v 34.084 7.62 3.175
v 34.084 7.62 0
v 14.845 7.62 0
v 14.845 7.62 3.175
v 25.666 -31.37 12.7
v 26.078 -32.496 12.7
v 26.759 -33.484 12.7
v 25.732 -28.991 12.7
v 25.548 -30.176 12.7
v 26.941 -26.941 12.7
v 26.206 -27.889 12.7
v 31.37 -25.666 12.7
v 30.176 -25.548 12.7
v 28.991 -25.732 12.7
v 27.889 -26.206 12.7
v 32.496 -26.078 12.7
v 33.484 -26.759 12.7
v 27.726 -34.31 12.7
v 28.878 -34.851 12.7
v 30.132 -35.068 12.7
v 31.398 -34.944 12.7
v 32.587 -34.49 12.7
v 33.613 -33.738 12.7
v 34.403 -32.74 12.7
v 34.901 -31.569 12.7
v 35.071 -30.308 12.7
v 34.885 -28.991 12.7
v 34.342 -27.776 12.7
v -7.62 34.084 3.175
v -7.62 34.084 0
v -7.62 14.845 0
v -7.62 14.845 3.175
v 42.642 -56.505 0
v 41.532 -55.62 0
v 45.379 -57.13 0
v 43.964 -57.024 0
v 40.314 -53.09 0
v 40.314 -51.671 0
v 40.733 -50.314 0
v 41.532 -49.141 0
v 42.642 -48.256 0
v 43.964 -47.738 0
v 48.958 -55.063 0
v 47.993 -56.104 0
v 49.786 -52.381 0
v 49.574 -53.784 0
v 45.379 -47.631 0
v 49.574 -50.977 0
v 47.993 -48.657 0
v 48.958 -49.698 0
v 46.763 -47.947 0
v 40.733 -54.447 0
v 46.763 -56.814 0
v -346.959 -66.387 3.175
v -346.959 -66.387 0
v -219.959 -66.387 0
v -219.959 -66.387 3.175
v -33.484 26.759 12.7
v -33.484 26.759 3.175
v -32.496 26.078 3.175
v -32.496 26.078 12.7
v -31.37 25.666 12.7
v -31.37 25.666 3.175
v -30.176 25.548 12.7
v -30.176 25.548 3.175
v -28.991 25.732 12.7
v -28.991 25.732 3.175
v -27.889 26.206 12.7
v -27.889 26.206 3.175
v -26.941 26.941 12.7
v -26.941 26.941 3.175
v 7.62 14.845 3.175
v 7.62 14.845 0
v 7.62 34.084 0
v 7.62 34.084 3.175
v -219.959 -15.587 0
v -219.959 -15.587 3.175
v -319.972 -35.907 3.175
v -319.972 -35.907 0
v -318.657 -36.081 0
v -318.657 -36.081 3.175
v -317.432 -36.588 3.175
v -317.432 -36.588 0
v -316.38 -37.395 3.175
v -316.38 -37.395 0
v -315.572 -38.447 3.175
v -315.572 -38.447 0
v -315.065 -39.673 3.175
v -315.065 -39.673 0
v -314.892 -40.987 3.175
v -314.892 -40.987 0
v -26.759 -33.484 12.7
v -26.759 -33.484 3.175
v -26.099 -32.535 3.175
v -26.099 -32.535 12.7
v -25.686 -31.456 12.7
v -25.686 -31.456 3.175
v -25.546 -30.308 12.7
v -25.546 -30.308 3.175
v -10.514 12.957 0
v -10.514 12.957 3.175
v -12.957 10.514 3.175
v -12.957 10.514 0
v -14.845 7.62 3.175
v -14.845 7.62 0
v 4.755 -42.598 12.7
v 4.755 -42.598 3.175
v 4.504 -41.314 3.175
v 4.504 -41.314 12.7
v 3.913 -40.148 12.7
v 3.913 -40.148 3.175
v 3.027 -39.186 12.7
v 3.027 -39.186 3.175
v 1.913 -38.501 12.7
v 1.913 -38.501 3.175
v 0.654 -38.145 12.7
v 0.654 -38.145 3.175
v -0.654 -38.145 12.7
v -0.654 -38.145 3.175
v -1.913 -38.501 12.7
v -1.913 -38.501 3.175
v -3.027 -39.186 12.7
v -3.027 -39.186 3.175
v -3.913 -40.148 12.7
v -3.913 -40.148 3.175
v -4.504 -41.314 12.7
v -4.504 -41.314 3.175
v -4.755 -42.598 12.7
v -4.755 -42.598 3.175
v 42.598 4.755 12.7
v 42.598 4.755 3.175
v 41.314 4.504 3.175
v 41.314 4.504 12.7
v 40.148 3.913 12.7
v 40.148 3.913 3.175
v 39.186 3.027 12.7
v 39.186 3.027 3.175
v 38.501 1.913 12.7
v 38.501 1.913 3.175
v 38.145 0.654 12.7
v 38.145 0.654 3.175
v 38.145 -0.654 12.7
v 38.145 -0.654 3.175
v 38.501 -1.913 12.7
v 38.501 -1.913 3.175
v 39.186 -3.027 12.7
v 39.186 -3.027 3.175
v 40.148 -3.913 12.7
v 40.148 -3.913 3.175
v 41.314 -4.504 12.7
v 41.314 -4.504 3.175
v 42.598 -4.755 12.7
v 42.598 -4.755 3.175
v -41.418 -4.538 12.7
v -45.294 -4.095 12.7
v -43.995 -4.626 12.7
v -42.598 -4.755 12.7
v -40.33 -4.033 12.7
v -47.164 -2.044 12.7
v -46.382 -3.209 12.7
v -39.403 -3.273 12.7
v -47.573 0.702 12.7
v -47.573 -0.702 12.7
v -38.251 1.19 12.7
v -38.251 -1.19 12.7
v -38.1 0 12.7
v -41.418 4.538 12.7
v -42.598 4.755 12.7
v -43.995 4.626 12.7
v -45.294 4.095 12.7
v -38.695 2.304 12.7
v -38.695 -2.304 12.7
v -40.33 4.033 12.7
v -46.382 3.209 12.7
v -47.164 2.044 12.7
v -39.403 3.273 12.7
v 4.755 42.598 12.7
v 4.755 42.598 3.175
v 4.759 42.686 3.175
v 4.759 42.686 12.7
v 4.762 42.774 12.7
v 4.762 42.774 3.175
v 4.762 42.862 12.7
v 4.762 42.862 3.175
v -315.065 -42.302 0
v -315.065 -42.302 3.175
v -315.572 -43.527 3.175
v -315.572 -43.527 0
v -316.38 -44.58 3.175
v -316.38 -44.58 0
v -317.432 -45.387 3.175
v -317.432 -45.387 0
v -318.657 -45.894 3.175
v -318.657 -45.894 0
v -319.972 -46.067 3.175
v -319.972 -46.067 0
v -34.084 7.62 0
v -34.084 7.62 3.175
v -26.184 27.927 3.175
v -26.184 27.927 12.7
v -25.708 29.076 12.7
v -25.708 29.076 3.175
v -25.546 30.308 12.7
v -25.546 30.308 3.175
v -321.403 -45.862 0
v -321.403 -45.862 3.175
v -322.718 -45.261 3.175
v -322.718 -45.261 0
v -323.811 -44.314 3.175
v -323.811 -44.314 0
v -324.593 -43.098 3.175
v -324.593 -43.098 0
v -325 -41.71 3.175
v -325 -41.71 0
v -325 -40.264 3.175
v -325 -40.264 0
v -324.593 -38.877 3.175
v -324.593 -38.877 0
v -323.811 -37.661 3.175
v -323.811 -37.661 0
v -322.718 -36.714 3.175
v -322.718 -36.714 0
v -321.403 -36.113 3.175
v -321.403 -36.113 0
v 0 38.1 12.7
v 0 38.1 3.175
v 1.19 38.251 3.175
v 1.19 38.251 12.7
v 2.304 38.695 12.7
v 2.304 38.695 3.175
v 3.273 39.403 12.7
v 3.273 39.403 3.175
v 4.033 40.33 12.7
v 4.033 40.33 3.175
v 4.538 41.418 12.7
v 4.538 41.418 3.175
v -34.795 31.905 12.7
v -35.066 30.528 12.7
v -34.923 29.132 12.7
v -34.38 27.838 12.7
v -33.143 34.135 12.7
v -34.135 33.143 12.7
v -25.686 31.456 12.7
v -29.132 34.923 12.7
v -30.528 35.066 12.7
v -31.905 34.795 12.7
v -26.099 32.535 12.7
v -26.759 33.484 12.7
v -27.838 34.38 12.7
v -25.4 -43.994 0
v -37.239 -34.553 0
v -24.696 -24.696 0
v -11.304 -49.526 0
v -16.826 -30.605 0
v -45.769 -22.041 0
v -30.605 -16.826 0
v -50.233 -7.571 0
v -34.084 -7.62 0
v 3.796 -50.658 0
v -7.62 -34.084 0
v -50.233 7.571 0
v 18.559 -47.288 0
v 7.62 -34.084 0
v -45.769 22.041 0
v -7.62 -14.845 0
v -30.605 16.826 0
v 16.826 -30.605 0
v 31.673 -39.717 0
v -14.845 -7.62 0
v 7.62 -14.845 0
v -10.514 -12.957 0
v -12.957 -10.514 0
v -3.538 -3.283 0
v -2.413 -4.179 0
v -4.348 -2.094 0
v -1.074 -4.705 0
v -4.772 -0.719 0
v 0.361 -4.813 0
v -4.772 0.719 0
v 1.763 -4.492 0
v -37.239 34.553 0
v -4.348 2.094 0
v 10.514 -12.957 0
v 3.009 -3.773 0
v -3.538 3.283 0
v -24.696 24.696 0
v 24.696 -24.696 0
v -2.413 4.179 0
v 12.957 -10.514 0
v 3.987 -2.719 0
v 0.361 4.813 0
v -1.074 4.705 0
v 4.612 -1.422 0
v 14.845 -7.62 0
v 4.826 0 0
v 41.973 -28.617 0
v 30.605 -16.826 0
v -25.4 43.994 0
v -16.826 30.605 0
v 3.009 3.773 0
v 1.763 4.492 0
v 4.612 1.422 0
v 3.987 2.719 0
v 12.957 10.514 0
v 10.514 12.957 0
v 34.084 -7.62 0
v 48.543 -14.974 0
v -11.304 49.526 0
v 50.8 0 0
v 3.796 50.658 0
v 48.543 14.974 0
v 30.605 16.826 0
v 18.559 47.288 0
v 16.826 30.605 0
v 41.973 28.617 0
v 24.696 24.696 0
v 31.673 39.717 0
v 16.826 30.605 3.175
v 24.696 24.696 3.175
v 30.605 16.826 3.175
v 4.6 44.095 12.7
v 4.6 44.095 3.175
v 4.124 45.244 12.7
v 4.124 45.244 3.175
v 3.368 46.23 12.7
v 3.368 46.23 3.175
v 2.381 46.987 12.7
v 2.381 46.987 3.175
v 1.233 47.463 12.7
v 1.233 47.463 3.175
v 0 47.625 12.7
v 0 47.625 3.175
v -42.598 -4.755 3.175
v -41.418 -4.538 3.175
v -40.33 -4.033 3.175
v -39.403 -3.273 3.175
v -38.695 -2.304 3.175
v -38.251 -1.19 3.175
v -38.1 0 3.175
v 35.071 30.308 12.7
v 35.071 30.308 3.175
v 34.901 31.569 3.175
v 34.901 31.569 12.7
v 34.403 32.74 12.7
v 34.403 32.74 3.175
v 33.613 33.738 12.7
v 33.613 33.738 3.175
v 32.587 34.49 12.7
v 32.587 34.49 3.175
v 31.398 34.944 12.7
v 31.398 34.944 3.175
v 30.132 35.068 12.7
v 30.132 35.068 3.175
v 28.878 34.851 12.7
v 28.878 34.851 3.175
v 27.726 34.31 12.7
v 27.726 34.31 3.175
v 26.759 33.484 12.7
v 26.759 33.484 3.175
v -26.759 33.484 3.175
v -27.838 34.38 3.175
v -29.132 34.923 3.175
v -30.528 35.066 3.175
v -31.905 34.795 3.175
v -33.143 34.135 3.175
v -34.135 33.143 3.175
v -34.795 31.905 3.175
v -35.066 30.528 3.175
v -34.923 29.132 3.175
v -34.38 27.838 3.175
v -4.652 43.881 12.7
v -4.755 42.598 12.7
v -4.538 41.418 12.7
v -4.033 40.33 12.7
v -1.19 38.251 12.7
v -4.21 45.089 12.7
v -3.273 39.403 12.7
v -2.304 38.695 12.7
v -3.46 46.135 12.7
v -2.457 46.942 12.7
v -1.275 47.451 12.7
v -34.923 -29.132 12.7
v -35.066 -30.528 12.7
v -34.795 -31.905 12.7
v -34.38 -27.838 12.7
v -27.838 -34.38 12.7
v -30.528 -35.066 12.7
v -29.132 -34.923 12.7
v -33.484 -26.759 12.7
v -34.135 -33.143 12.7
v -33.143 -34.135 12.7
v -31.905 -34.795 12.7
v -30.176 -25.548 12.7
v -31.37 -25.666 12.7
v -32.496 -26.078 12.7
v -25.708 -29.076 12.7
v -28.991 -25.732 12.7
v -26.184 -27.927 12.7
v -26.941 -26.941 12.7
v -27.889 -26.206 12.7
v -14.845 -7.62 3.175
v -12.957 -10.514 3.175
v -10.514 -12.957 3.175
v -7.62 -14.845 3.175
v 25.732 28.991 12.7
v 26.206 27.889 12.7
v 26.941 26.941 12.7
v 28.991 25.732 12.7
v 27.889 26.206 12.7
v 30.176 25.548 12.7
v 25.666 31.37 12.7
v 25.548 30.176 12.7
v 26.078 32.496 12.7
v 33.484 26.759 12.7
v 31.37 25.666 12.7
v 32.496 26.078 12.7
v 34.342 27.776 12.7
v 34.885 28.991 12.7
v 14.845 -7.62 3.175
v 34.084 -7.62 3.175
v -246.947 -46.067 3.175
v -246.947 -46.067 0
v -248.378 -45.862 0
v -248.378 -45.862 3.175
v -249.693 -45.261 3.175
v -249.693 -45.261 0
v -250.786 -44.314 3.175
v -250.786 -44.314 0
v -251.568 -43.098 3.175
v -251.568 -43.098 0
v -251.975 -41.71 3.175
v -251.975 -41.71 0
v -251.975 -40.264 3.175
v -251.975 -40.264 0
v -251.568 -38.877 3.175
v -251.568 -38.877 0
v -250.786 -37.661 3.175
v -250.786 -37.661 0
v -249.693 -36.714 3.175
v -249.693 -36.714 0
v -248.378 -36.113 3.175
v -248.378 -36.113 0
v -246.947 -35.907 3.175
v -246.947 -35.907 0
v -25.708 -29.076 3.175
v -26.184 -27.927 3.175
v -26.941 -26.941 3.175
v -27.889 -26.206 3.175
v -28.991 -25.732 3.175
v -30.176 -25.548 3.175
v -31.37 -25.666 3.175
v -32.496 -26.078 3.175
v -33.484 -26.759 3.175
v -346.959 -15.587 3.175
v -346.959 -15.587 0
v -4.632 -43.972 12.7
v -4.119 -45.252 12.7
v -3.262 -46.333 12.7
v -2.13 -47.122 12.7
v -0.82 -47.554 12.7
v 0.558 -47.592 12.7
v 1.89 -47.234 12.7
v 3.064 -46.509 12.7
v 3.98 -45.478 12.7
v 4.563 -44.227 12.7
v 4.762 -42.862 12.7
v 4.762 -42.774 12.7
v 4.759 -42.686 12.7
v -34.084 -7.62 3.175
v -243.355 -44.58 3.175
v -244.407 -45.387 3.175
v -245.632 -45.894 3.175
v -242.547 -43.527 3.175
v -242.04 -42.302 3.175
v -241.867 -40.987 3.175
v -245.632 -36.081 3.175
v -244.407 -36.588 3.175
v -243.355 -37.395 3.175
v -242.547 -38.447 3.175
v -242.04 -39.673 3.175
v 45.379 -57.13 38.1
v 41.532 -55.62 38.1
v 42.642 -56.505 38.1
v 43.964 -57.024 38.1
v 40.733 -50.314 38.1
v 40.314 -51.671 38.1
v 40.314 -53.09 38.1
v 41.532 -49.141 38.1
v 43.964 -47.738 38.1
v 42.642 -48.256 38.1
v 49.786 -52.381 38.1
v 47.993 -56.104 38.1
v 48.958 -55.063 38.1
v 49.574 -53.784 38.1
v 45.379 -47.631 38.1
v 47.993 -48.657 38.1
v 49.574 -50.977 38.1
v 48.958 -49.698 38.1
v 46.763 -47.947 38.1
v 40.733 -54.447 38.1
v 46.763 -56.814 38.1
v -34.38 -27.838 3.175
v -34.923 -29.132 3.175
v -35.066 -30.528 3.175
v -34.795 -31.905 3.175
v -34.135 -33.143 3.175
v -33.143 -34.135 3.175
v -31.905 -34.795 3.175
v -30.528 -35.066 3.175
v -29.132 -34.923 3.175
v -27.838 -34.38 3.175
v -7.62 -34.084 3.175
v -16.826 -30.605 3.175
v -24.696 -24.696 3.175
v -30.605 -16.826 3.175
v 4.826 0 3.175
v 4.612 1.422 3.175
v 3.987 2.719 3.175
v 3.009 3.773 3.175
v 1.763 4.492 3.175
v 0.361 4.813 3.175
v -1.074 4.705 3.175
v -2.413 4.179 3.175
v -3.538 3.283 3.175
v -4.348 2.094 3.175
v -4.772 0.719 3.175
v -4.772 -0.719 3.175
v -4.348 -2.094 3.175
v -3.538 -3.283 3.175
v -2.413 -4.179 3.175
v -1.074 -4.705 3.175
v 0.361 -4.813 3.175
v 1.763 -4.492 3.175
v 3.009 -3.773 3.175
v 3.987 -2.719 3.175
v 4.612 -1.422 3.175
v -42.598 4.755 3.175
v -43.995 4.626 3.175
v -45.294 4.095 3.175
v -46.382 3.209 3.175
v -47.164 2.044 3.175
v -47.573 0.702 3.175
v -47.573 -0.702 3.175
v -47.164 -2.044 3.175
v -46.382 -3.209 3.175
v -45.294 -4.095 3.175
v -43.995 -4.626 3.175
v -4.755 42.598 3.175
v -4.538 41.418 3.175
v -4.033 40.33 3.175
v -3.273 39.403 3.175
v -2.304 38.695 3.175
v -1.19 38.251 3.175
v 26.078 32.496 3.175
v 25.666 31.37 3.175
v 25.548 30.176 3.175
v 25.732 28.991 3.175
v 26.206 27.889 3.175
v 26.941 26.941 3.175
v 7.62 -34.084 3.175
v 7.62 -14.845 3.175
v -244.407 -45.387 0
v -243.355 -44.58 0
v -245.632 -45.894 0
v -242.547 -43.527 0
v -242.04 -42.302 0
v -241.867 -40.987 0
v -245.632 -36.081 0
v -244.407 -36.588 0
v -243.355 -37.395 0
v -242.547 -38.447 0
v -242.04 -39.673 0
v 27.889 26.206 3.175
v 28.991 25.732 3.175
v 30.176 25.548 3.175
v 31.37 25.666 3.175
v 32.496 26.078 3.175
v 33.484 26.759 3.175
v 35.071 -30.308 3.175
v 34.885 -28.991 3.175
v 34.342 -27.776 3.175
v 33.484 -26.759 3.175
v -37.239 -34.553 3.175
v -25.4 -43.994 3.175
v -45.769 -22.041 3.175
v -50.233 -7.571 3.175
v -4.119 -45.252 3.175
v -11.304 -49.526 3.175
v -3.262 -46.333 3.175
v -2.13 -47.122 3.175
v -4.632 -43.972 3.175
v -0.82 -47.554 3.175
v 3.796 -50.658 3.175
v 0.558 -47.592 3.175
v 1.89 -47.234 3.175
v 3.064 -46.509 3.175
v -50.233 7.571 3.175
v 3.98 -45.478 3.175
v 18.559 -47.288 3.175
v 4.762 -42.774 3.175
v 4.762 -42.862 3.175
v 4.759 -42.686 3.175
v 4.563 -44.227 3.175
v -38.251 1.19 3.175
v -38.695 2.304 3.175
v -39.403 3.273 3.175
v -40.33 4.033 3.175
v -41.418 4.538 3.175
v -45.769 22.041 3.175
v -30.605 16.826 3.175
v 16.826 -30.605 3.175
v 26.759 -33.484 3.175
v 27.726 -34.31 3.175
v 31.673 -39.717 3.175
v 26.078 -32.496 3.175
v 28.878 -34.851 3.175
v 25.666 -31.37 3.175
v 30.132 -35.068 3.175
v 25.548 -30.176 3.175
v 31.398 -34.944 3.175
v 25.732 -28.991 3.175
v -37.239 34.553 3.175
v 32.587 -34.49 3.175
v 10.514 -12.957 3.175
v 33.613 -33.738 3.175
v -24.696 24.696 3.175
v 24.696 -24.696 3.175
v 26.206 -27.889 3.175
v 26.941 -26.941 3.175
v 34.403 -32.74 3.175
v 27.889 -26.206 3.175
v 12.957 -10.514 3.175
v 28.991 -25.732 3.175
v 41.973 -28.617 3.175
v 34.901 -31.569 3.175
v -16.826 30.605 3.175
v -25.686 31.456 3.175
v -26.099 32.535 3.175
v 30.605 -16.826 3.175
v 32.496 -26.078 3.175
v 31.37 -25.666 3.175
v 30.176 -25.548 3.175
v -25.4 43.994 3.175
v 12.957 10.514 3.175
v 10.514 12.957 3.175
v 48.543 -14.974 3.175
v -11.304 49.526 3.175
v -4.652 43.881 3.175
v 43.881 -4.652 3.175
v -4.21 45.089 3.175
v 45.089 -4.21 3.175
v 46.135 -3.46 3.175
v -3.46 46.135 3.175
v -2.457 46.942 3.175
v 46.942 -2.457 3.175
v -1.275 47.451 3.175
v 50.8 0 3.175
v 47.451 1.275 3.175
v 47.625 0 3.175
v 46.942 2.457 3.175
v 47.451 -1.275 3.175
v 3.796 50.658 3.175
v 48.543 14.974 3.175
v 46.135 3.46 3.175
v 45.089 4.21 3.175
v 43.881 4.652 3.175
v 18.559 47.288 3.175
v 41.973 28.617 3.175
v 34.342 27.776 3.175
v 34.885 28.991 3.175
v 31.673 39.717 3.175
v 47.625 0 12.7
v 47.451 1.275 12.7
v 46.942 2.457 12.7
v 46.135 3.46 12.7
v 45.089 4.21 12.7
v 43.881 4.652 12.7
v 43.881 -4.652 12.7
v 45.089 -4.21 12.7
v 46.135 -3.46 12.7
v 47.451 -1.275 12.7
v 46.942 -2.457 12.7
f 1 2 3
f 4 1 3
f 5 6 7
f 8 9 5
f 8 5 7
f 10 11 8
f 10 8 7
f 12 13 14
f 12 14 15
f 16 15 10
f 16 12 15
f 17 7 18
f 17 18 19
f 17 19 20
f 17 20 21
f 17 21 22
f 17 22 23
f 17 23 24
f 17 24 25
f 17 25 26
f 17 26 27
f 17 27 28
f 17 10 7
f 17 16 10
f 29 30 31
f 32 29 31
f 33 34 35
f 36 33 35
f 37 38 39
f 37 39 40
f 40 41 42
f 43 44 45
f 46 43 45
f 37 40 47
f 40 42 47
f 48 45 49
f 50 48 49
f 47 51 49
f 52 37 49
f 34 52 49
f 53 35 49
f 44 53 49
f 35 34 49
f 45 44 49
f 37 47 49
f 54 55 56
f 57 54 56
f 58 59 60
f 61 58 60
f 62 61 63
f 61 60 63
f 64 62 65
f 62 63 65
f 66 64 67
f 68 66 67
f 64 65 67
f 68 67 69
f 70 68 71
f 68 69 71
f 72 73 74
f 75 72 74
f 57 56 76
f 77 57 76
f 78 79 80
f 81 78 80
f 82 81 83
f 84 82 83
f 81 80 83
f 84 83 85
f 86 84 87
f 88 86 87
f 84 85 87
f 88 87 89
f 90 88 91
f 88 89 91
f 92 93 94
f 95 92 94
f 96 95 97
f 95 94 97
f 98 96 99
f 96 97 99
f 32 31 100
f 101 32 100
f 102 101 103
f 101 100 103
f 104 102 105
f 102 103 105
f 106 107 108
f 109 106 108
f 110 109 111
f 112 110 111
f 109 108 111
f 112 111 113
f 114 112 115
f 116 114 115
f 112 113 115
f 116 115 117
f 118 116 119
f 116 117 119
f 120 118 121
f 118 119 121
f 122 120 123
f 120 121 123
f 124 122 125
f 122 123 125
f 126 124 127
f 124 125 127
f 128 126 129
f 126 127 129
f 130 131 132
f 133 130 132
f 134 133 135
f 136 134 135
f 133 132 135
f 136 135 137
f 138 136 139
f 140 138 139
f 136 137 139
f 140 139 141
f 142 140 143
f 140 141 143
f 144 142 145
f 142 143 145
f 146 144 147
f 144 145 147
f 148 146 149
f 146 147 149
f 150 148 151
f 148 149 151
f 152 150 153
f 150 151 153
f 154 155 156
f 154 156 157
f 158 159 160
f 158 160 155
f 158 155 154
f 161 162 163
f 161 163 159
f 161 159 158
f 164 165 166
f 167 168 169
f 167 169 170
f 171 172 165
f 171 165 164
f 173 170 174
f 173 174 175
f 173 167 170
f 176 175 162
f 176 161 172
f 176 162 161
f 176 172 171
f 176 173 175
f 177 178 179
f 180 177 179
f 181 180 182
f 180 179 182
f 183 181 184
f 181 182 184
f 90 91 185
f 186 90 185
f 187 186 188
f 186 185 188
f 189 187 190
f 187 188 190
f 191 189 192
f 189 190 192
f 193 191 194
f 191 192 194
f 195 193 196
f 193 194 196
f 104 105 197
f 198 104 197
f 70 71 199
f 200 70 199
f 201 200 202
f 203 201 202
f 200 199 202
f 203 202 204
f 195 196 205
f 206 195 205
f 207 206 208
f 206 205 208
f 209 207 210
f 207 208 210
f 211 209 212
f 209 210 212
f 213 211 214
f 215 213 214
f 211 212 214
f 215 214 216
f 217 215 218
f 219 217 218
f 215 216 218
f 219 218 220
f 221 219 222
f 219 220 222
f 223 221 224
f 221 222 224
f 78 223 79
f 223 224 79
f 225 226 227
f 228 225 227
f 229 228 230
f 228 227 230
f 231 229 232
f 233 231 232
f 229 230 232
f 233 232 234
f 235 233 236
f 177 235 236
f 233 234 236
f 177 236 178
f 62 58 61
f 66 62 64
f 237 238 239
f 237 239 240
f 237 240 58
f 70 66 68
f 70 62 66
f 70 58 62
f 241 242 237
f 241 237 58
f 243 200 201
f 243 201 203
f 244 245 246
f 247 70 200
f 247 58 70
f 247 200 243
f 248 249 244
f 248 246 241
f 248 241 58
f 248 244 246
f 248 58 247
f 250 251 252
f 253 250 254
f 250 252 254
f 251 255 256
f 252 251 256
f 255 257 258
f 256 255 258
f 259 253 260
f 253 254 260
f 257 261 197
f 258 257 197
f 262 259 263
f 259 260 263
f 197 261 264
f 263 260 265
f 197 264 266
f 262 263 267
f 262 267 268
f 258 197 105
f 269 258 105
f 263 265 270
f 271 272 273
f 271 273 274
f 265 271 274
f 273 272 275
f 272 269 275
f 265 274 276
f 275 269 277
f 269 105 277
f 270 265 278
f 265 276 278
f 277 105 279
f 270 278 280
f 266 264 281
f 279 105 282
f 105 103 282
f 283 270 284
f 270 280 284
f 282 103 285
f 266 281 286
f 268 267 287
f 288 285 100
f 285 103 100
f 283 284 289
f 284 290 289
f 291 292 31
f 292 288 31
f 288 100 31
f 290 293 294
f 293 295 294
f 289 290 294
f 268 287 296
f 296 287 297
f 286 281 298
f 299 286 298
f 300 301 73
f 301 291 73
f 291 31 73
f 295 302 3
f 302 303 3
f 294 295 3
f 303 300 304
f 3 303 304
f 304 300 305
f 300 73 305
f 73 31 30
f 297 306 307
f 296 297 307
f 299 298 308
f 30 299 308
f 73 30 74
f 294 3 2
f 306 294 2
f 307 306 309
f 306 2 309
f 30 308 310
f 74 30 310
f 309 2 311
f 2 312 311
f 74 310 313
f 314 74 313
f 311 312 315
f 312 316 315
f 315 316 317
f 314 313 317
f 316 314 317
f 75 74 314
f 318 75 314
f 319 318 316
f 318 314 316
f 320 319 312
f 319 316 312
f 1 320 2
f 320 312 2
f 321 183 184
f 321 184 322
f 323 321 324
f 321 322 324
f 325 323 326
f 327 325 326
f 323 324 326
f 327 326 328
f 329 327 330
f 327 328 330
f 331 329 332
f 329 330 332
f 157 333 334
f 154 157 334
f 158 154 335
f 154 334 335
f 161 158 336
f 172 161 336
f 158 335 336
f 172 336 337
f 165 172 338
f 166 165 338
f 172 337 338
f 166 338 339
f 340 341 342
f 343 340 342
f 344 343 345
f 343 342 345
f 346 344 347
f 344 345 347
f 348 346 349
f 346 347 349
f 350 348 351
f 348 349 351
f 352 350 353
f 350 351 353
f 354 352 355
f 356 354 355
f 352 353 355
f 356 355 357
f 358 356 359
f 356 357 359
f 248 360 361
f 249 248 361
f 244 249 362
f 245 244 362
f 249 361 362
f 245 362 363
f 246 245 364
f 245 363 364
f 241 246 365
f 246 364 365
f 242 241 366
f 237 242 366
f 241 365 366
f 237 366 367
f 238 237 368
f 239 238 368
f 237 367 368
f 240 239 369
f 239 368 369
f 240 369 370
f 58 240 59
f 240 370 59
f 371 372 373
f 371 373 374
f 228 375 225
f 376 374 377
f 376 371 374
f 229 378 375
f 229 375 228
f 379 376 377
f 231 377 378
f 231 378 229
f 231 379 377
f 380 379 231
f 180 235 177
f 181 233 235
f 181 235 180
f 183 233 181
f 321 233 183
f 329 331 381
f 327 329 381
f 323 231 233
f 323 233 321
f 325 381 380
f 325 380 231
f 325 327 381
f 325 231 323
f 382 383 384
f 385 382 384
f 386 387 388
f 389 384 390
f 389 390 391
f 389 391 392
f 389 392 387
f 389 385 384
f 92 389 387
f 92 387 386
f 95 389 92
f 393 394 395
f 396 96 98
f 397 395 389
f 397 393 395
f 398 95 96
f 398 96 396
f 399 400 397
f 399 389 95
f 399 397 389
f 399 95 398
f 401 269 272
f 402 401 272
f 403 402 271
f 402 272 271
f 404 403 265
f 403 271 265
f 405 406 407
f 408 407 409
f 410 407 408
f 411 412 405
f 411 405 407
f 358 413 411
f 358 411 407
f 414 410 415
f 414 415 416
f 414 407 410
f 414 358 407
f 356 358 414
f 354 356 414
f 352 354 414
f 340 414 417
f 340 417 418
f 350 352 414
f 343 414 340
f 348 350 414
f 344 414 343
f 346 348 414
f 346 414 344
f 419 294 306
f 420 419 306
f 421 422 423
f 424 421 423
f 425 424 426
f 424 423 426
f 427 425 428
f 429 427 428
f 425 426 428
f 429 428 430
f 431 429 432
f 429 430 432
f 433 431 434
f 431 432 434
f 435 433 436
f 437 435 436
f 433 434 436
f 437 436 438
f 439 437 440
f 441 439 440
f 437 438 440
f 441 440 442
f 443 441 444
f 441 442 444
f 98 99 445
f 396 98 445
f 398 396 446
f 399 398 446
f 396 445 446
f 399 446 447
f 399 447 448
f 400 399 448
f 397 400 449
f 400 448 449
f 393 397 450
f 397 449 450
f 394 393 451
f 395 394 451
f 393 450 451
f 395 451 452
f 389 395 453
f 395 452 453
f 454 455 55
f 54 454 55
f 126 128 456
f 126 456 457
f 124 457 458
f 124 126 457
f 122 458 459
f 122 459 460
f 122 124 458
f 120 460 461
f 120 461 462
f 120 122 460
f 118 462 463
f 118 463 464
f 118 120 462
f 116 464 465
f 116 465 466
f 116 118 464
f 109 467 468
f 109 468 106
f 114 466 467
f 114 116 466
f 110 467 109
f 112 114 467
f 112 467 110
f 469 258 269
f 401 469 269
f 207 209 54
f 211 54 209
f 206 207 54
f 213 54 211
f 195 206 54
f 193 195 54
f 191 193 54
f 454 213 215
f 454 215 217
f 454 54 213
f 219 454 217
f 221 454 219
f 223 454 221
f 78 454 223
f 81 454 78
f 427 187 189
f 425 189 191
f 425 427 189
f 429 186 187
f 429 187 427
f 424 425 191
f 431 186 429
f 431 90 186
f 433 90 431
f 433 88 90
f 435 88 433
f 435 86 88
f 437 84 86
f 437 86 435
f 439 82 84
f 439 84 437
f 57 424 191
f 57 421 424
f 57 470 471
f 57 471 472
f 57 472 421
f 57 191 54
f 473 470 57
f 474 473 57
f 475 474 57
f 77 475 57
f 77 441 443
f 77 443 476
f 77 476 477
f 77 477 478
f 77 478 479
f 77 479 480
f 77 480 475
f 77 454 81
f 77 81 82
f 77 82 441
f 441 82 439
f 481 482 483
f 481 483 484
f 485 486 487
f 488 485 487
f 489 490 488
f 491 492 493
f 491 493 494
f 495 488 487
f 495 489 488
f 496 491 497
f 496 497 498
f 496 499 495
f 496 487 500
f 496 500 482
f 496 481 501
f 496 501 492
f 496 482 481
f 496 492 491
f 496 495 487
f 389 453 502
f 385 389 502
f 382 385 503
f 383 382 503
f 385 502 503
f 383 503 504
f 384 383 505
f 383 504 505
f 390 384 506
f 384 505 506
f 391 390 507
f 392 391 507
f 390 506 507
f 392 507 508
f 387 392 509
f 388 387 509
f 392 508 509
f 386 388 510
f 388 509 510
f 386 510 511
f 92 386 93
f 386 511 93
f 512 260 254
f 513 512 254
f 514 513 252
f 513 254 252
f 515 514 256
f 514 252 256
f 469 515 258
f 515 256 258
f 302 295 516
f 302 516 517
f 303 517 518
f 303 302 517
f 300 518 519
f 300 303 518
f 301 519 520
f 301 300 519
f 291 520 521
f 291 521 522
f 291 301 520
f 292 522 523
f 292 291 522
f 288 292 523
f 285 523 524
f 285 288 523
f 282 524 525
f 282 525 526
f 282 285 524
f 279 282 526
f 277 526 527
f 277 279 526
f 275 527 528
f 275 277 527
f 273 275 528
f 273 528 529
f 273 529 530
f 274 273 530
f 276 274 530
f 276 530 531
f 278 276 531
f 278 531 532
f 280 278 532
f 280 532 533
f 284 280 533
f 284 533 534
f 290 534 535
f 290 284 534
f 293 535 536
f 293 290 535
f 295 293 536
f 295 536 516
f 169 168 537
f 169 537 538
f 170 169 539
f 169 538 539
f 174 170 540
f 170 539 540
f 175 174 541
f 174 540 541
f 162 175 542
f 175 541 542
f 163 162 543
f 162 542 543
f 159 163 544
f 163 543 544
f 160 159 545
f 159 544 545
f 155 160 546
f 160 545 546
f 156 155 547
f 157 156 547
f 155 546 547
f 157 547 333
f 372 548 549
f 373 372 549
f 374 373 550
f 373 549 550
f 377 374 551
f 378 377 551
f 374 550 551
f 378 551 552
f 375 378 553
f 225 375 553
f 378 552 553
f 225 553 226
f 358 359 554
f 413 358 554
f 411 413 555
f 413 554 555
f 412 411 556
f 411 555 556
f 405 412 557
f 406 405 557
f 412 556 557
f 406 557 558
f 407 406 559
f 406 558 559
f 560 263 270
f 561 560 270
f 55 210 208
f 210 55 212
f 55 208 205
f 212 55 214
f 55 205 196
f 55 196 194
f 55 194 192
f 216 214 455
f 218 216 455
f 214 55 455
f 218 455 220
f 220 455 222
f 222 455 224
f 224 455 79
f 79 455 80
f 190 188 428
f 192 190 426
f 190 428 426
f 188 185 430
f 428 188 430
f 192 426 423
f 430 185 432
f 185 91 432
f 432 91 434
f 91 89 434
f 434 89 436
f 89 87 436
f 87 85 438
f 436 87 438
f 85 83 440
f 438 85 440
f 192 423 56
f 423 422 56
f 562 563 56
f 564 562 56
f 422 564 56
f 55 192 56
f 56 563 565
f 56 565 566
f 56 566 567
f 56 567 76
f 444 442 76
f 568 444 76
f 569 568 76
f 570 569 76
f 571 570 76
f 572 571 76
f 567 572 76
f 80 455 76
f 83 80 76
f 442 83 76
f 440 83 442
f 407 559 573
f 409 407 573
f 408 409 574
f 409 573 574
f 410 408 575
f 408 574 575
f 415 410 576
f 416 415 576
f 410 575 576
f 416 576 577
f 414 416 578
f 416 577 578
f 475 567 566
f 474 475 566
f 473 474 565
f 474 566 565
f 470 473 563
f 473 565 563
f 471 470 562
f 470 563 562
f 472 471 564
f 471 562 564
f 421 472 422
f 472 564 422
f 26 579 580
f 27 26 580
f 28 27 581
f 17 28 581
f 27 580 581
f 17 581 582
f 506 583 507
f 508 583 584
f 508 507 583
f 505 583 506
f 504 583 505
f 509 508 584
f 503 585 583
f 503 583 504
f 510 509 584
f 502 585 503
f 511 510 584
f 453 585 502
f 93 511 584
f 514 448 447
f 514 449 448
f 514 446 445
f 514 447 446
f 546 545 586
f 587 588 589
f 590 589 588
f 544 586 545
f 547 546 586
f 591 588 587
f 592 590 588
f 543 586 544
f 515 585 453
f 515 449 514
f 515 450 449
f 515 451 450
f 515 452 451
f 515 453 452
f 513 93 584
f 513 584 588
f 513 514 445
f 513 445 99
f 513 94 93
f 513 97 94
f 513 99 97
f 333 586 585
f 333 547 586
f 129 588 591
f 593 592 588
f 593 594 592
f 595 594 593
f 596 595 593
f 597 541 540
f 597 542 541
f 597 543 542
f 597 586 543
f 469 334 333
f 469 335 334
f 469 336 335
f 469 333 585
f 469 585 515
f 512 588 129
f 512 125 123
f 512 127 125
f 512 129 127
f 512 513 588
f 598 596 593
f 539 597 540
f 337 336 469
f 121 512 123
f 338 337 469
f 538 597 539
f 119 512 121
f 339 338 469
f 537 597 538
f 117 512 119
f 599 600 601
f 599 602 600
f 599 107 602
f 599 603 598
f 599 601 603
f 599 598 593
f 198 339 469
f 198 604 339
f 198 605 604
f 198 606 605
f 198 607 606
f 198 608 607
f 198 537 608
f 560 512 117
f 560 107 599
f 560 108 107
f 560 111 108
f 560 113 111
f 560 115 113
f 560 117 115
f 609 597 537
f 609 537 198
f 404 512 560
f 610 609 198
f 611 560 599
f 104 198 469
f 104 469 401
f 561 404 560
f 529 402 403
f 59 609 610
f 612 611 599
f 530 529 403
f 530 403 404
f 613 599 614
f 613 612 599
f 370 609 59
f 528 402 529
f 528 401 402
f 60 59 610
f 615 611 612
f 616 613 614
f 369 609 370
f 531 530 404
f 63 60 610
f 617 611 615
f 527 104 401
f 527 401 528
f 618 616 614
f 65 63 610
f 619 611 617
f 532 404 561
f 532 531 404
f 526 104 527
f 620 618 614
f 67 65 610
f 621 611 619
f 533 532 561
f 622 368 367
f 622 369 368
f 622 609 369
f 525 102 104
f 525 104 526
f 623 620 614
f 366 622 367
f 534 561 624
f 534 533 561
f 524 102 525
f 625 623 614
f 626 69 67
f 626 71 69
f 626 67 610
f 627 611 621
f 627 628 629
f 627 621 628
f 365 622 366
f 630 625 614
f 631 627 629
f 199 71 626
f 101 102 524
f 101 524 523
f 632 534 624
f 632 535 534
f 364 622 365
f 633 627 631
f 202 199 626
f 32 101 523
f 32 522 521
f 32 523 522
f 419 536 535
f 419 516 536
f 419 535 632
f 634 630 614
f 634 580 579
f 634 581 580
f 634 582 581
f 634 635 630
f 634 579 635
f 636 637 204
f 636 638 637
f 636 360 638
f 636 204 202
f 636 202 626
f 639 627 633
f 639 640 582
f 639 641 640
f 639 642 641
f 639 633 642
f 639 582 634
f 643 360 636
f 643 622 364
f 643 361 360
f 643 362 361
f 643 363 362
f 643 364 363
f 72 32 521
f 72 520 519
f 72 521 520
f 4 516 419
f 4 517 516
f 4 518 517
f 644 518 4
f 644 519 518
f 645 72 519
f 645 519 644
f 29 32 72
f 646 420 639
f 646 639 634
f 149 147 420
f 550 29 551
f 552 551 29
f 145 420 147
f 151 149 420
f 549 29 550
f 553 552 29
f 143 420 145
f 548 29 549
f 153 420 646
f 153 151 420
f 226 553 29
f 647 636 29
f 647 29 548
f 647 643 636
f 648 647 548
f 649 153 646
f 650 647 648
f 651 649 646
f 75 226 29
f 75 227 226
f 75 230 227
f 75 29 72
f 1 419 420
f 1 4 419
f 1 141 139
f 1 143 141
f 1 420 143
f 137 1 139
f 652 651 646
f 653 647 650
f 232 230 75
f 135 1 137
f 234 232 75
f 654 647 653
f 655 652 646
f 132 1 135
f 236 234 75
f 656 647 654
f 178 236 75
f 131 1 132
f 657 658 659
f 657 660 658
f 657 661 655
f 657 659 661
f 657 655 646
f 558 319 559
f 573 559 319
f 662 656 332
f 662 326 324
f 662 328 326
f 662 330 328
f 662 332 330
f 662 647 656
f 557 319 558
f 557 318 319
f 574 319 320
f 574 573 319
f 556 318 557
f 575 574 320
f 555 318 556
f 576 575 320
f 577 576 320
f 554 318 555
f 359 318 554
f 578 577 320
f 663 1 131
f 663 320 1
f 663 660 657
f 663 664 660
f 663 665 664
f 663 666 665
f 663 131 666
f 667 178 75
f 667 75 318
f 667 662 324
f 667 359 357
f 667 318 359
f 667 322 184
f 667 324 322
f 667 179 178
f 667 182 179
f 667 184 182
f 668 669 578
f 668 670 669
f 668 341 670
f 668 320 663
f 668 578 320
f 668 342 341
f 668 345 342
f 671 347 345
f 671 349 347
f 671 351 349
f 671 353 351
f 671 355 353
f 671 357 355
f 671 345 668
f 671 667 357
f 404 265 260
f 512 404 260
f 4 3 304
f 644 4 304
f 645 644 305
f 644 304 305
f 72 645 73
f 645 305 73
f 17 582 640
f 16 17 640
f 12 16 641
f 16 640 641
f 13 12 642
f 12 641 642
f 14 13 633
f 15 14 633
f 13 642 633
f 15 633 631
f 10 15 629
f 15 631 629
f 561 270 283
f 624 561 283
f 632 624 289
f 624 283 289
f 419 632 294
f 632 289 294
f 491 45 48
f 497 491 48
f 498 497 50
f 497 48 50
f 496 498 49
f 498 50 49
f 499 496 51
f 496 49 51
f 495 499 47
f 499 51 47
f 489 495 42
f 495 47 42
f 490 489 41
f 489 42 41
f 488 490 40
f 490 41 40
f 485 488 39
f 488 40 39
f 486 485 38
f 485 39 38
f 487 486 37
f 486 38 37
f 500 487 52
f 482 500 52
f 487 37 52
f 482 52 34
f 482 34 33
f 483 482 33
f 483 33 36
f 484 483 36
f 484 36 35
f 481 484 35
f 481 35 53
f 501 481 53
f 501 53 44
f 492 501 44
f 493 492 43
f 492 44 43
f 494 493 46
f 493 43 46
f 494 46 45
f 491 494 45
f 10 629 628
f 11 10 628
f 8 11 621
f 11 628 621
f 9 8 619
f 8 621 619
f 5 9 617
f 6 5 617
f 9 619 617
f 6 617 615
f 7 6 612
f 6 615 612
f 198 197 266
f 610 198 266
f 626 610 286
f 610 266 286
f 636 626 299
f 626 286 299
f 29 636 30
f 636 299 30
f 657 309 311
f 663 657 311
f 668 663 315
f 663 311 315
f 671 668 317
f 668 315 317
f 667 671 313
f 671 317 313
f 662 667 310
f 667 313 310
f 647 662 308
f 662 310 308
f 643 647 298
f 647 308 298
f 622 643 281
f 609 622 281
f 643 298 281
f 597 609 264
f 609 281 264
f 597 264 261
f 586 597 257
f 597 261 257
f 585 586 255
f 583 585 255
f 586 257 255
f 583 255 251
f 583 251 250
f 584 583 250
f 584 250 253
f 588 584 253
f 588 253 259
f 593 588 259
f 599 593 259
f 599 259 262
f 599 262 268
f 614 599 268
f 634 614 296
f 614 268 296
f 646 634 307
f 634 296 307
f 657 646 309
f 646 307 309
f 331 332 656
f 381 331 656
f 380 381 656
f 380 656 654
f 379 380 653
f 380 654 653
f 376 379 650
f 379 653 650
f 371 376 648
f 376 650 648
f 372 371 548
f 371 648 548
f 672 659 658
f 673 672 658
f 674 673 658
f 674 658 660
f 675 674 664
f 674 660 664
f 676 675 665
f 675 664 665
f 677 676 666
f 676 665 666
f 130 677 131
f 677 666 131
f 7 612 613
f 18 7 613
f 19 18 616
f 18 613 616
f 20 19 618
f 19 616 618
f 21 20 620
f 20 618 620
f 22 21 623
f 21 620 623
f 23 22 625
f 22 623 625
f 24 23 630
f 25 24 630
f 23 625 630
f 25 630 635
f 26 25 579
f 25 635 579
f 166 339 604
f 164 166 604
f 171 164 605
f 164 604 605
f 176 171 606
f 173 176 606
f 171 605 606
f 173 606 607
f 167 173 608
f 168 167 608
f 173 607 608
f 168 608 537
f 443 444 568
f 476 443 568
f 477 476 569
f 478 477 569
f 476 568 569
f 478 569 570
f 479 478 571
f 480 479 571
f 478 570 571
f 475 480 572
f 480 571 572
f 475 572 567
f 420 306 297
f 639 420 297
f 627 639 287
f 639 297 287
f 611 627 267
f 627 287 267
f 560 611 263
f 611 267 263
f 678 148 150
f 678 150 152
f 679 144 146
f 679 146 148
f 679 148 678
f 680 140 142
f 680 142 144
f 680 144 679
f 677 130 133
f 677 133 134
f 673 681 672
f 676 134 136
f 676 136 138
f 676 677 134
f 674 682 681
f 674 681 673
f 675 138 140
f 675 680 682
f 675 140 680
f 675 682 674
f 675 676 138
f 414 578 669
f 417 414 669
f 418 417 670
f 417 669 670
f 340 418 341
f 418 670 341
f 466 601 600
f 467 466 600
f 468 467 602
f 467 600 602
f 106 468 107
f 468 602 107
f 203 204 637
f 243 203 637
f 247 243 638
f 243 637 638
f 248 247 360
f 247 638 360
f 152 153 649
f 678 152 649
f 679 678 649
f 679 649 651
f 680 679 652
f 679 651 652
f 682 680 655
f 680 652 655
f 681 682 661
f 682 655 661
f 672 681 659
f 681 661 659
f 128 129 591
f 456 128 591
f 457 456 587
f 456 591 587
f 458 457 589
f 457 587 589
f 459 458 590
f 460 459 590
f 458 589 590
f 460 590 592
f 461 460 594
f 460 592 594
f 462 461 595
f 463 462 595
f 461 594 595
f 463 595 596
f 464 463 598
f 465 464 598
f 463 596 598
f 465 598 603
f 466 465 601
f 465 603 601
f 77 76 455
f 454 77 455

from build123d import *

# Parameters (mm, degrees)
F0_R      = 50.8
F0_R_2    = 4.826
F1_DEPTH  = 3.175
F3_DEPTH  = 3.175
F2_R      = 4.7625
F4_DEPTH  = 38.1
F6_DEPTH  = 9.525
F8_DEPTH  = 3.175
F11_DEPTH = 3.175


with BuildPart() as f1:
    # F0 (on Top) → F1 (new body)
    with BuildSketch(Plane.XY):
        Circle(F0_R)
        with BuildLine():
            ThreePointArc((-7.62, -34.0835917268), (-24.6957043329, -24.6957043329), (-34.0835917268, -7.62))
            Line((-34.0835917268, -7.62), (-14.8446440983, -7.62))
            ThreePointArc((-14.8446440983, -7.62), (-11.7988952535, -11.7988952535), (-7.62, -14.8446440983))
            Line((-7.62, -14.8446440983), (-7.62, -34.0835917268))
        make_face(mode=Mode.SUBTRACT)
        Circle(F0_R_2, mode=Mode.SUBTRACT)
        with BuildLine():
            Line((7.62, -34.0835917268), (7.62, -14.8446440983))
            ThreePointArc((7.62, -14.8446440983), (11.7988952535, -11.7988952535), (14.8446440983, -7.62))
            Line((14.8446440983, -7.62), (34.0835917268, -7.62))
            ThreePointArc((34.0835917268, -7.62), (24.6957043329, -24.6957043329), (7.62, -34.0835917268))
        make_face(mode=Mode.SUBTRACT)
        with BuildLine():
            Line((-7.62, 34.0835917268), (-7.62, 14.8446440983))
            ThreePointArc((-7.62, 14.8446440983), (-11.7988952535, 11.7988952535), (-14.8446440983, 7.62))
            Line((-14.8446440983, 7.62), (-34.0835917268, 7.62))
            ThreePointArc((-34.0835917268, 7.62), (-24.6957043329, 24.6957043329), (-7.62, 34.0835917268))
        make_face(mode=Mode.SUBTRACT)
        with BuildLine():
            ThreePointArc((7.62, 34.0835917268), (24.6957043329, 24.6957043329), (34.0835917268, 7.62))
            Line((34.0835917268, 7.62), (14.8446440983, 7.62))
            ThreePointArc((14.8446440983, 7.62), (11.7988952535, 11.7988952535), (7.62, 14.8446440983))
            Line((7.62, 14.8446440983), (7.62, 34.0835917268))
        make_face(mode=Mode.SUBTRACT)
    extrude(amount=F1_DEPTH)

    # F5 (on face) → F6 (join)
    with BuildSketch(Plane.XY.offset(3.175)):
        with BuildLine():
            ThreePointArc((-42.5979166667, 4.7551447833), (-47.625, 0), (-42.5979166667, -4.7551447833))
            ThreePointArc((-42.5979166667, -4.7551447833), (-42.8625, 0), (-42.5979166667, 4.7551447833))
        make_face()
        with BuildLine():
            ThreePointArc((-42.5979166667, 4.7551447833), (-42.8625, 0), (-42.5979166667, -4.7551447833))
            ThreePointArc((-42.5979166667, -4.7551447833), (-39.4026239636, -3.2727150903), (-38.1, 0))
            ThreePointArc((-38.1, 0), (-39.4026239636, 3.2727150903), (-42.5979166667, 4.7551447833))
        make_face()
        with BuildLine():
            ThreePointArc((-30.3083644086, 30.3083644086), (-28.5777580732, 31.9453541186), (-26.7588806177, 33.4836708612))
            ThreePointArc((-26.7588806177, 33.4836708612), (-33.675960454, 33.675960454), (-33.4836708612, 26.7588806177))
            ThreePointArc((-33.4836708612, 26.7588806177), (-31.9453541186, 28.5777580732), (-30.3083644086, 30.3083644086))
        make_face()
        with BuildLine():
            ThreePointArc((-25.5458644086, 30.3083644086), (-25.8594419096, 32.0079216591), (-26.7588806177, 33.4836708612))
            ThreePointArc((-26.7588806177, 33.4836708612), (-28.5777580732, 31.9453541186), (-30.3083644086, 30.3083644086))
            Line((-30.3083644086, 30.3083644086), (-26.9407683632, 26.9407683632))
            ThreePointArc((-26.9407683632, 26.9407683632), (-25.908388135, 28.485834562), (-25.5458644086, 30.3083644086))
        make_face()
        with BuildLine():
            Line((-26.9407683632, 26.9407683632), (-30.3083644086, 30.3083644086))
            ThreePointArc((-30.3083644086, 30.3083644086), (-31.9453541186, 28.5777580732), (-33.4836708612, 26.7588806177))
            ThreePointArc((-33.4836708612, 26.7588806177), (-30.1760216344, 25.5477035679), (-26.9407683632, 26.9407683632))
        make_face()
        with BuildLine():
            ThreePointArc((-4.7551447833, 42.5979166667), (-2.38125, 42.7963030493), (0, 42.8625))
            Line((0, 42.8625), (0, 47.625))
            ThreePointArc((0, 47.625), (-3.4598760364, 46.1352150903), (-4.7551447833, 42.5979166667))
        make_face()
        with BuildLine():
            ThreePointArc((0, 42.8625), (2.38125, 42.7963030493), (4.7551447833, 42.5979166667))
            ThreePointArc((4.7551447833, 42.5979166667), (4.7606608407, 42.7301572258), (4.7625, 42.8625))
            ThreePointArc((4.7625, 42.8625), (3.3675960454, 46.2300960454), (0, 47.625))
            Line((0, 47.625), (0, 42.8625))
        make_face()
        with BuildLine():
            ThreePointArc((0, 38.1), (3.2727150903, 39.4026239636), (4.7551447833, 42.5979166667))
            ThreePointArc((4.7551447833, 42.5979166667), (2.38125, 42.7963030493), (0, 42.8625))
            Line((0, 42.8625), (0, 38.1))
        make_face()
        with BuildLine():
            Line((0, 38.1), (0, 42.8625))
            ThreePointArc((0, 42.8625), (-2.38125, 42.7963030493), (-4.7551447833, 42.5979166667))
            ThreePointArc((-4.7551447833, 42.5979166667), (-3.2727150903, 39.4026239636), (0, 38.1))
        make_face()
        with BuildLine():
            Line((26.9407683632, 26.9407683632), (30.3083644086, 30.3083644086))
            ThreePointArc((30.3083644086, 30.3083644086), (28.5777580732, 31.9453541186), (26.7588806177, 33.4836708612))
            ThreePointArc((26.7588806177, 33.4836708612), (25.5477035679, 30.1760216344), (26.9407683632, 26.9407683632))
        make_face()
        with BuildLine():
            ThreePointArc((30.3083644086, 30.3083644086), (31.9453541186, 28.5777580732), (33.4836708612, 26.7588806177))
            ThreePointArc((33.4836708612, 26.7588806177), (34.6559961335, 28.3642695974), (35.0708644086, 30.3083644086))
            ThreePointArc((35.0708644086, 30.3083644086), (32.0079216591, 34.7572869076), (26.7588806177, 33.4836708612))
            ThreePointArc((26.7588806177, 33.4836708612), (28.5777580732, 31.9453541186), (30.3083644086, 30.3083644086))
        make_face()
        with BuildLine():
            ThreePointArc((26.9407683632, 26.9407683632), (30.1760216344, 25.5477035679), (33.4836708612, 26.7588806177))
            ThreePointArc((33.4836708612, 26.7588806177), (31.9453541186, 28.5777580732), (30.3083644086, 30.3083644086))
            Line((30.3083644086, 30.3083644086), (26.9407683632, 26.9407683632))
        make_face()
        with BuildLine():
            ThreePointArc((42.5979166667, -4.7551447833), (42.7963030493, -2.38125), (42.8625, 0))
            ThreePointArc((42.8625, 0), (42.7963030493, 2.38125), (42.5979166667, 4.7551447833))
            ThreePointArc((42.5979166667, 4.7551447833), (38.1, 0), (42.5979166667, -4.7551447833))
        make_face()
        with BuildLine():
            ThreePointArc((42.5979166667, 4.7551447833), (42.7963030493, 2.38125), (42.8625, 0))
            ThreePointArc((42.8625, 0), (42.7963030493, -2.38125), (42.5979166667, -4.7551447833))
            ThreePointArc((42.5979166667, -4.7551447833), (46.1352150903, -3.4598760364), (47.625, 0))
            ThreePointArc((47.625, 0), (46.1352150903, 3.4598760364), (42.5979166667, 4.7551447833))
        make_face()
        with BuildLine():
            ThreePointArc((-33.4836708612, -26.7588806177), (-33.675960454, -33.675960454), (-26.7588806177, -33.4836708612))
            ThreePointArc((-26.7588806177, -33.4836708612), (-28.5777580732, -31.9453541186), (-30.3083644086, -30.3083644086))
            ThreePointArc((-30.3083644086, -30.3083644086), (-31.9453541186, -28.5777580732), (-33.4836708612, -26.7588806177))
        make_face()
        with BuildLine():
            ThreePointArc((-30.3083644086, -30.3083644086), (-28.5777580732, -31.9453541186), (-26.7588806177, -33.4836708612))
            ThreePointArc((-26.7588806177, -33.4836708612), (-25.8594419096, -32.0079216591), (-25.5458644086, -30.3083644086))
            ThreePointArc((-25.5458644086, -30.3083644086), (-25.908388135, -28.485834562), (-26.9407683632, -26.9407683632))
            Line((-26.9407683632, -26.9407683632), (-30.3083644086, -30.3083644086))
        make_face()
        with BuildLine():
            ThreePointArc((-33.4836708612, -26.7588806177), (-31.9453541186, -28.5777580732), (-30.3083644086, -30.3083644086))
            Line((-30.3083644086, -30.3083644086), (-26.9407683632, -26.9407683632))
            ThreePointArc((-26.9407683632, -26.9407683632), (-30.1760216344, -25.5477035679), (-33.4836708612, -26.7588806177))
        make_face()
        with BuildLine():
            ThreePointArc((-4.7551447833, -42.5979166667), (0, -42.8625), (4.7551447833, -42.5979166667))
            ThreePointArc((4.7551447833, -42.5979166667), (0, -38.1), (-4.7551447833, -42.5979166667))
        make_face()
        with BuildLine():
            ThreePointArc((4.7625, -42.8625), (4.7606608407, -42.7301572258), (4.7551447833, -42.5979166667))
            ThreePointArc((4.7551447833, -42.5979166667), (0, -42.8625), (-4.7551447833, -42.5979166667))
            ThreePointArc((-4.7551447833, -42.5979166667), (-0.1323427742, -47.6231608407), (4.7625, -42.8625))
        make_face()
        with BuildLine():
            ThreePointArc((26.7588806177, -33.4836708612), (28.5777580732, -31.9453541186), (30.3083644086, -30.3083644086))
            Line((30.3083644086, -30.3083644086), (26.9407683632, -26.9407683632))
            ThreePointArc((26.9407683632, -26.9407683632), (25.5477035679, -30.1760216344), (26.7588806177, -33.4836708612))
        make_face()
        with BuildLine():
            ThreePointArc((30.3083644086, -30.3083644086), (31.9453541186, -28.5777580732), (33.4836708612, -26.7588806177))
            ThreePointArc((33.4836708612, -26.7588806177), (30.1760216344, -25.5477035679), (26.9407683632, -26.9407683632))
            Line((26.9407683632, -26.9407683632), (30.3083644086, -30.3083644086))
        make_face()
        with BuildLine():
            ThreePointArc((35.0708644086, -30.3083644086), (34.6559961335, -28.3642695974), (33.4836708612, -26.7588806177))
            ThreePointArc((33.4836708612, -26.7588806177), (31.9453541186, -28.5777580732), (30.3083644086, -30.3083644086))
            ThreePointArc((30.3083644086, -30.3083644086), (28.5777580732, -31.9453541186), (26.7588806177, -33.4836708612))
            ThreePointArc((26.7588806177, -33.4836708612), (32.0079216591, -34.7572869076), (35.0708644086, -30.3083644086))
        make_face()
    extrude(amount=F6_DEPTH)


with BuildPart() as f3:
    # F2 (on Top) → F3 (new body)
    with BuildSketch(Plane.XY):
        with BuildLine():
            Line((-319.9716319146, -15.5874290968), (-346.9591319146, -15.5874290968))
            Line((-346.9591319146, -15.5874290968), (-346.9591319146, -66.3874290968))
            Line((-346.9591319146, -66.3874290968), (-319.9716319146, -66.3874290968))
            Line((-319.9716319146, -66.3874290968), (-319.9716319146, -46.0674290968))
            ThreePointArc((-319.9716319146, -46.0674290968), (-325.0516319146, -40.9874290968), (-319.9716319146, -35.9074290968))
            Line((-319.9716319146, -35.9074290968), (-319.9716319146, -15.5874290968))
        make_face()
        with BuildLine():
            Line((-246.9466319146, -15.5874290968), (-319.9716319146, -15.5874290968))
            Line((-319.9716319146, -15.5874290968), (-319.9716319146, -35.9074290968))
            ThreePointArc((-319.9716319146, -35.9074290968), (-316.3795294661, -37.3953266483), (-314.8916319146, -40.9874290968))
            ThreePointArc((-314.8916319146, -40.9874290968), (-316.3795294661, -44.5795315452), (-319.9716319146, -46.0674290968))
            Line((-319.9716319146, -46.0674290968), (-319.9716319146, -66.3874290968))
            Line((-319.9716319146, -66.3874290968), (-246.9466319146, -66.3874290968))
            Line((-246.9466319146, -66.3874290968), (-246.9466319146, -46.0674290968))
            ThreePointArc((-246.9466319146, -46.0674290968), (-252.0266319146, -40.9874290968), (-246.9466319146, -35.9074290968))
            Line((-246.9466319146, -35.9074290968), (-246.9466319146, -15.5874290968))
        make_face()
        with BuildLine():
            Line((-219.9591319146, -15.5874290968), (-246.9466319146, -15.5874290968))
            Line((-246.9466319146, -15.5874290968), (-246.9466319146, -35.9074290968))
            ThreePointArc((-246.9466319146, -35.9074290968), (-243.3545294661, -37.3953266483), (-241.8666319146, -40.9874290968))
            ThreePointArc((-241.8666319146, -40.9874290968), (-243.3545294661, -44.5795315452), (-246.9466319146, -46.0674290968))
            Line((-246.9466319146, -46.0674290968), (-246.9466319146, -66.3874290968))
            Line((-246.9466319146, -66.3874290968), (-219.9591319146, -66.3874290968))
            Line((-219.9591319146, -66.3874290968), (-219.9591319146, -15.5874290968))
        make_face()
    extrude(amount=F3_DEPTH)


with BuildPart() as f4:
    # F2 (on Top) → F4 (new body)
    with BuildSketch(Plane.XY):
        with Locations((45.0234785676, -52.3806475103)):
            Circle(F2_R)
    extrude(amount=F4_DEPTH)


with BuildPart() as f8:
    # F7 (on Top) → F8 (new body)
    with BuildSketch(Plane.XY):
        with BuildLine():
            Line((-183.2109061122, -127.57224737), (-259.4109061122, -127.57224737))
            Line((-259.4109061122, -127.57224737), (-259.4109061122, -148.14624737))
            ThreePointArc((-259.4109061122, -148.14624737), (-255.9984087862, -149.559750044), (-254.5849061122, -152.97224737))
            Line((-254.5849061122, -152.97224737), (-188.0369061122, -152.97224737))
            ThreePointArc((-188.0369061122, -152.97224737), (-186.6234034382, -149.559750044), (-183.2109061122, -148.14624737))
            Line((-183.2109061122, -148.14624737), (-183.2109061122, -127.57224737))
        make_face()
        with BuildLine():
            Line((-188.0369061122, -152.97224737), (-254.5849061122, -152.97224737))
            ThreePointArc((-254.5849061122, -152.97224737), (-255.9984087862, -156.384744696), (-259.4109061122, -157.79824737))
            Line((-259.4109061122, -157.79824737), (-259.4109061122, -178.37224737))
            Line((-259.4109061122, -178.37224737), (-183.2109061122, -178.37224737))
            Line((-183.2109061122, -178.37224737), (-183.2109061122, -157.79824737))
            ThreePointArc((-183.2109061122, -157.79824737), (-186.6234034382, -156.384744696), (-188.0369061122, -152.97224737))
        make_face()
        with BuildLine():
            Line((-264.2369061122, -152.97224737), (-284.8109061122, -152.97224737))
            Line((-284.8109061122, -152.97224737), (-284.8109061122, -178.37224737))
            Line((-284.8109061122, -178.37224737), (-259.4109061122, -178.37224737))
            Line((-259.4109061122, -178.37224737), (-259.4109061122, -157.79824737))
            ThreePointArc((-259.4109061122, -157.79824737), (-262.8234034382, -156.384744696), (-264.2369061122, -152.97224737))
        make_face()
        with BuildLine():
            Line((-259.4109061122, -127.57224737), (-284.8109061122, -127.57224737))
            Line((-284.8109061122, -127.57224737), (-284.8109061122, -152.97224737))
            Line((-284.8109061122, -152.97224737), (-264.2369061122, -152.97224737))
            ThreePointArc((-264.2369061122, -152.97224737), (-262.8234034382, -149.559750044), (-259.4109061122, -148.14624737))
            Line((-259.4109061122, -148.14624737), (-259.4109061122, -127.57224737))
        make_face()
        with BuildLine():
            Line((-157.8109061122, -127.57224737), (-183.2109061122, -127.57224737))
            Line((-183.2109061122, -127.57224737), (-183.2109061122, -148.14624737))
            ThreePointArc((-183.2109061122, -148.14624737), (-179.7984087862, -149.559750044), (-178.3849061122, -152.97224737))
            Line((-178.3849061122, -152.97224737), (-157.8109061122, -152.97224737))
            Line((-157.8109061122, -152.97224737), (-157.8109061122, -127.57224737))
        make_face()
        with BuildLine():
            Line((-157.8109061122, -178.37224737), (-157.8109061122, -152.97224737))
            Line((-157.8109061122, -152.97224737), (-178.3849061122, -152.97224737))
            ThreePointArc((-178.3849061122, -152.97224737), (-179.7984087862, -156.384744696), (-183.2109061122, -157.79824737))
            Line((-183.2109061122, -157.79824737), (-183.2109061122, -178.37224737))
            Line((-183.2109061122, -178.37224737), (-157.8109061122, -178.37224737))
        make_face()
    extrude(amount=F8_DEPTH)


with BuildPart() as f11:
    # F2 (on Top) → F11 (new body)
    with BuildSketch(Plane.XY):
        with BuildLine():
            Line((-319.9716319146, -15.5874290968), (-346.9591319146, -15.5874290968))
            Line((-346.9591319146, -15.5874290968), (-346.9591319146, -66.3874290968))
            Line((-346.9591319146, -66.3874290968), (-319.9716319146, -66.3874290968))
            Line((-319.9716319146, -66.3874290968), (-319.9716319146, -46.0674290968))
            ThreePointArc((-319.9716319146, -46.0674290968), (-325.0516319146, -40.9874290968), (-319.9716319146, -35.9074290968))
            Line((-319.9716319146, -35.9074290968), (-319.9716319146, -15.5874290968))
        make_face()
        with BuildLine():
            Line((-219.9591319146, -15.5874290968), (-246.9466319146, -15.5874290968))
            Line((-246.9466319146, -15.5874290968), (-246.9466319146, -35.9074290968))
            ThreePointArc((-246.9466319146, -35.9074290968), (-243.3545294661, -37.3953266483), (-241.8666319146, -40.9874290968))
            ThreePointArc((-241.8666319146, -40.9874290968), (-243.3545294661, -44.5795315452), (-246.9466319146, -46.0674290968))
            Line((-246.9466319146, -46.0674290968), (-246.9466319146, -66.3874290968))
            Line((-246.9466319146, -66.3874290968), (-219.9591319146, -66.3874290968))
            Line((-219.9591319146, -66.3874290968), (-219.9591319146, -15.5874290968))
        make_face()
        with BuildLine():
            Line((-246.9466319146, -15.5874290968), (-319.9716319146, -15.5874290968))
            Line((-319.9716319146, -15.5874290968), (-319.9716319146, -35.9074290968))
            ThreePointArc((-319.9716319146, -35.9074290968), (-316.3795294661, -37.3953266483), (-314.8916319146, -40.9874290968))
            ThreePointArc((-314.8916319146, -40.9874290968), (-316.3795294661, -44.5795315452), (-319.9716319146, -46.0674290968))
            Line((-319.9716319146, -46.0674290968), (-319.9716319146, -66.3874290968))
            Line((-319.9716319146, -66.3874290968), (-246.9466319146, -66.3874290968))
            Line((-246.9466319146, -66.3874290968), (-246.9466319146, -46.0674290968))
            ThreePointArc((-246.9466319146, -46.0674290968), (-252.0266319146, -40.9874290968), (-246.9466319146, -35.9074290968))
            Line((-246.9466319146, -35.9074290968), (-246.9466319146, -15.5874290968))
        make_face()
    extrude(amount=F11_DEPTH)


solid = Compound([f1.part, f4.part, f11.part])
